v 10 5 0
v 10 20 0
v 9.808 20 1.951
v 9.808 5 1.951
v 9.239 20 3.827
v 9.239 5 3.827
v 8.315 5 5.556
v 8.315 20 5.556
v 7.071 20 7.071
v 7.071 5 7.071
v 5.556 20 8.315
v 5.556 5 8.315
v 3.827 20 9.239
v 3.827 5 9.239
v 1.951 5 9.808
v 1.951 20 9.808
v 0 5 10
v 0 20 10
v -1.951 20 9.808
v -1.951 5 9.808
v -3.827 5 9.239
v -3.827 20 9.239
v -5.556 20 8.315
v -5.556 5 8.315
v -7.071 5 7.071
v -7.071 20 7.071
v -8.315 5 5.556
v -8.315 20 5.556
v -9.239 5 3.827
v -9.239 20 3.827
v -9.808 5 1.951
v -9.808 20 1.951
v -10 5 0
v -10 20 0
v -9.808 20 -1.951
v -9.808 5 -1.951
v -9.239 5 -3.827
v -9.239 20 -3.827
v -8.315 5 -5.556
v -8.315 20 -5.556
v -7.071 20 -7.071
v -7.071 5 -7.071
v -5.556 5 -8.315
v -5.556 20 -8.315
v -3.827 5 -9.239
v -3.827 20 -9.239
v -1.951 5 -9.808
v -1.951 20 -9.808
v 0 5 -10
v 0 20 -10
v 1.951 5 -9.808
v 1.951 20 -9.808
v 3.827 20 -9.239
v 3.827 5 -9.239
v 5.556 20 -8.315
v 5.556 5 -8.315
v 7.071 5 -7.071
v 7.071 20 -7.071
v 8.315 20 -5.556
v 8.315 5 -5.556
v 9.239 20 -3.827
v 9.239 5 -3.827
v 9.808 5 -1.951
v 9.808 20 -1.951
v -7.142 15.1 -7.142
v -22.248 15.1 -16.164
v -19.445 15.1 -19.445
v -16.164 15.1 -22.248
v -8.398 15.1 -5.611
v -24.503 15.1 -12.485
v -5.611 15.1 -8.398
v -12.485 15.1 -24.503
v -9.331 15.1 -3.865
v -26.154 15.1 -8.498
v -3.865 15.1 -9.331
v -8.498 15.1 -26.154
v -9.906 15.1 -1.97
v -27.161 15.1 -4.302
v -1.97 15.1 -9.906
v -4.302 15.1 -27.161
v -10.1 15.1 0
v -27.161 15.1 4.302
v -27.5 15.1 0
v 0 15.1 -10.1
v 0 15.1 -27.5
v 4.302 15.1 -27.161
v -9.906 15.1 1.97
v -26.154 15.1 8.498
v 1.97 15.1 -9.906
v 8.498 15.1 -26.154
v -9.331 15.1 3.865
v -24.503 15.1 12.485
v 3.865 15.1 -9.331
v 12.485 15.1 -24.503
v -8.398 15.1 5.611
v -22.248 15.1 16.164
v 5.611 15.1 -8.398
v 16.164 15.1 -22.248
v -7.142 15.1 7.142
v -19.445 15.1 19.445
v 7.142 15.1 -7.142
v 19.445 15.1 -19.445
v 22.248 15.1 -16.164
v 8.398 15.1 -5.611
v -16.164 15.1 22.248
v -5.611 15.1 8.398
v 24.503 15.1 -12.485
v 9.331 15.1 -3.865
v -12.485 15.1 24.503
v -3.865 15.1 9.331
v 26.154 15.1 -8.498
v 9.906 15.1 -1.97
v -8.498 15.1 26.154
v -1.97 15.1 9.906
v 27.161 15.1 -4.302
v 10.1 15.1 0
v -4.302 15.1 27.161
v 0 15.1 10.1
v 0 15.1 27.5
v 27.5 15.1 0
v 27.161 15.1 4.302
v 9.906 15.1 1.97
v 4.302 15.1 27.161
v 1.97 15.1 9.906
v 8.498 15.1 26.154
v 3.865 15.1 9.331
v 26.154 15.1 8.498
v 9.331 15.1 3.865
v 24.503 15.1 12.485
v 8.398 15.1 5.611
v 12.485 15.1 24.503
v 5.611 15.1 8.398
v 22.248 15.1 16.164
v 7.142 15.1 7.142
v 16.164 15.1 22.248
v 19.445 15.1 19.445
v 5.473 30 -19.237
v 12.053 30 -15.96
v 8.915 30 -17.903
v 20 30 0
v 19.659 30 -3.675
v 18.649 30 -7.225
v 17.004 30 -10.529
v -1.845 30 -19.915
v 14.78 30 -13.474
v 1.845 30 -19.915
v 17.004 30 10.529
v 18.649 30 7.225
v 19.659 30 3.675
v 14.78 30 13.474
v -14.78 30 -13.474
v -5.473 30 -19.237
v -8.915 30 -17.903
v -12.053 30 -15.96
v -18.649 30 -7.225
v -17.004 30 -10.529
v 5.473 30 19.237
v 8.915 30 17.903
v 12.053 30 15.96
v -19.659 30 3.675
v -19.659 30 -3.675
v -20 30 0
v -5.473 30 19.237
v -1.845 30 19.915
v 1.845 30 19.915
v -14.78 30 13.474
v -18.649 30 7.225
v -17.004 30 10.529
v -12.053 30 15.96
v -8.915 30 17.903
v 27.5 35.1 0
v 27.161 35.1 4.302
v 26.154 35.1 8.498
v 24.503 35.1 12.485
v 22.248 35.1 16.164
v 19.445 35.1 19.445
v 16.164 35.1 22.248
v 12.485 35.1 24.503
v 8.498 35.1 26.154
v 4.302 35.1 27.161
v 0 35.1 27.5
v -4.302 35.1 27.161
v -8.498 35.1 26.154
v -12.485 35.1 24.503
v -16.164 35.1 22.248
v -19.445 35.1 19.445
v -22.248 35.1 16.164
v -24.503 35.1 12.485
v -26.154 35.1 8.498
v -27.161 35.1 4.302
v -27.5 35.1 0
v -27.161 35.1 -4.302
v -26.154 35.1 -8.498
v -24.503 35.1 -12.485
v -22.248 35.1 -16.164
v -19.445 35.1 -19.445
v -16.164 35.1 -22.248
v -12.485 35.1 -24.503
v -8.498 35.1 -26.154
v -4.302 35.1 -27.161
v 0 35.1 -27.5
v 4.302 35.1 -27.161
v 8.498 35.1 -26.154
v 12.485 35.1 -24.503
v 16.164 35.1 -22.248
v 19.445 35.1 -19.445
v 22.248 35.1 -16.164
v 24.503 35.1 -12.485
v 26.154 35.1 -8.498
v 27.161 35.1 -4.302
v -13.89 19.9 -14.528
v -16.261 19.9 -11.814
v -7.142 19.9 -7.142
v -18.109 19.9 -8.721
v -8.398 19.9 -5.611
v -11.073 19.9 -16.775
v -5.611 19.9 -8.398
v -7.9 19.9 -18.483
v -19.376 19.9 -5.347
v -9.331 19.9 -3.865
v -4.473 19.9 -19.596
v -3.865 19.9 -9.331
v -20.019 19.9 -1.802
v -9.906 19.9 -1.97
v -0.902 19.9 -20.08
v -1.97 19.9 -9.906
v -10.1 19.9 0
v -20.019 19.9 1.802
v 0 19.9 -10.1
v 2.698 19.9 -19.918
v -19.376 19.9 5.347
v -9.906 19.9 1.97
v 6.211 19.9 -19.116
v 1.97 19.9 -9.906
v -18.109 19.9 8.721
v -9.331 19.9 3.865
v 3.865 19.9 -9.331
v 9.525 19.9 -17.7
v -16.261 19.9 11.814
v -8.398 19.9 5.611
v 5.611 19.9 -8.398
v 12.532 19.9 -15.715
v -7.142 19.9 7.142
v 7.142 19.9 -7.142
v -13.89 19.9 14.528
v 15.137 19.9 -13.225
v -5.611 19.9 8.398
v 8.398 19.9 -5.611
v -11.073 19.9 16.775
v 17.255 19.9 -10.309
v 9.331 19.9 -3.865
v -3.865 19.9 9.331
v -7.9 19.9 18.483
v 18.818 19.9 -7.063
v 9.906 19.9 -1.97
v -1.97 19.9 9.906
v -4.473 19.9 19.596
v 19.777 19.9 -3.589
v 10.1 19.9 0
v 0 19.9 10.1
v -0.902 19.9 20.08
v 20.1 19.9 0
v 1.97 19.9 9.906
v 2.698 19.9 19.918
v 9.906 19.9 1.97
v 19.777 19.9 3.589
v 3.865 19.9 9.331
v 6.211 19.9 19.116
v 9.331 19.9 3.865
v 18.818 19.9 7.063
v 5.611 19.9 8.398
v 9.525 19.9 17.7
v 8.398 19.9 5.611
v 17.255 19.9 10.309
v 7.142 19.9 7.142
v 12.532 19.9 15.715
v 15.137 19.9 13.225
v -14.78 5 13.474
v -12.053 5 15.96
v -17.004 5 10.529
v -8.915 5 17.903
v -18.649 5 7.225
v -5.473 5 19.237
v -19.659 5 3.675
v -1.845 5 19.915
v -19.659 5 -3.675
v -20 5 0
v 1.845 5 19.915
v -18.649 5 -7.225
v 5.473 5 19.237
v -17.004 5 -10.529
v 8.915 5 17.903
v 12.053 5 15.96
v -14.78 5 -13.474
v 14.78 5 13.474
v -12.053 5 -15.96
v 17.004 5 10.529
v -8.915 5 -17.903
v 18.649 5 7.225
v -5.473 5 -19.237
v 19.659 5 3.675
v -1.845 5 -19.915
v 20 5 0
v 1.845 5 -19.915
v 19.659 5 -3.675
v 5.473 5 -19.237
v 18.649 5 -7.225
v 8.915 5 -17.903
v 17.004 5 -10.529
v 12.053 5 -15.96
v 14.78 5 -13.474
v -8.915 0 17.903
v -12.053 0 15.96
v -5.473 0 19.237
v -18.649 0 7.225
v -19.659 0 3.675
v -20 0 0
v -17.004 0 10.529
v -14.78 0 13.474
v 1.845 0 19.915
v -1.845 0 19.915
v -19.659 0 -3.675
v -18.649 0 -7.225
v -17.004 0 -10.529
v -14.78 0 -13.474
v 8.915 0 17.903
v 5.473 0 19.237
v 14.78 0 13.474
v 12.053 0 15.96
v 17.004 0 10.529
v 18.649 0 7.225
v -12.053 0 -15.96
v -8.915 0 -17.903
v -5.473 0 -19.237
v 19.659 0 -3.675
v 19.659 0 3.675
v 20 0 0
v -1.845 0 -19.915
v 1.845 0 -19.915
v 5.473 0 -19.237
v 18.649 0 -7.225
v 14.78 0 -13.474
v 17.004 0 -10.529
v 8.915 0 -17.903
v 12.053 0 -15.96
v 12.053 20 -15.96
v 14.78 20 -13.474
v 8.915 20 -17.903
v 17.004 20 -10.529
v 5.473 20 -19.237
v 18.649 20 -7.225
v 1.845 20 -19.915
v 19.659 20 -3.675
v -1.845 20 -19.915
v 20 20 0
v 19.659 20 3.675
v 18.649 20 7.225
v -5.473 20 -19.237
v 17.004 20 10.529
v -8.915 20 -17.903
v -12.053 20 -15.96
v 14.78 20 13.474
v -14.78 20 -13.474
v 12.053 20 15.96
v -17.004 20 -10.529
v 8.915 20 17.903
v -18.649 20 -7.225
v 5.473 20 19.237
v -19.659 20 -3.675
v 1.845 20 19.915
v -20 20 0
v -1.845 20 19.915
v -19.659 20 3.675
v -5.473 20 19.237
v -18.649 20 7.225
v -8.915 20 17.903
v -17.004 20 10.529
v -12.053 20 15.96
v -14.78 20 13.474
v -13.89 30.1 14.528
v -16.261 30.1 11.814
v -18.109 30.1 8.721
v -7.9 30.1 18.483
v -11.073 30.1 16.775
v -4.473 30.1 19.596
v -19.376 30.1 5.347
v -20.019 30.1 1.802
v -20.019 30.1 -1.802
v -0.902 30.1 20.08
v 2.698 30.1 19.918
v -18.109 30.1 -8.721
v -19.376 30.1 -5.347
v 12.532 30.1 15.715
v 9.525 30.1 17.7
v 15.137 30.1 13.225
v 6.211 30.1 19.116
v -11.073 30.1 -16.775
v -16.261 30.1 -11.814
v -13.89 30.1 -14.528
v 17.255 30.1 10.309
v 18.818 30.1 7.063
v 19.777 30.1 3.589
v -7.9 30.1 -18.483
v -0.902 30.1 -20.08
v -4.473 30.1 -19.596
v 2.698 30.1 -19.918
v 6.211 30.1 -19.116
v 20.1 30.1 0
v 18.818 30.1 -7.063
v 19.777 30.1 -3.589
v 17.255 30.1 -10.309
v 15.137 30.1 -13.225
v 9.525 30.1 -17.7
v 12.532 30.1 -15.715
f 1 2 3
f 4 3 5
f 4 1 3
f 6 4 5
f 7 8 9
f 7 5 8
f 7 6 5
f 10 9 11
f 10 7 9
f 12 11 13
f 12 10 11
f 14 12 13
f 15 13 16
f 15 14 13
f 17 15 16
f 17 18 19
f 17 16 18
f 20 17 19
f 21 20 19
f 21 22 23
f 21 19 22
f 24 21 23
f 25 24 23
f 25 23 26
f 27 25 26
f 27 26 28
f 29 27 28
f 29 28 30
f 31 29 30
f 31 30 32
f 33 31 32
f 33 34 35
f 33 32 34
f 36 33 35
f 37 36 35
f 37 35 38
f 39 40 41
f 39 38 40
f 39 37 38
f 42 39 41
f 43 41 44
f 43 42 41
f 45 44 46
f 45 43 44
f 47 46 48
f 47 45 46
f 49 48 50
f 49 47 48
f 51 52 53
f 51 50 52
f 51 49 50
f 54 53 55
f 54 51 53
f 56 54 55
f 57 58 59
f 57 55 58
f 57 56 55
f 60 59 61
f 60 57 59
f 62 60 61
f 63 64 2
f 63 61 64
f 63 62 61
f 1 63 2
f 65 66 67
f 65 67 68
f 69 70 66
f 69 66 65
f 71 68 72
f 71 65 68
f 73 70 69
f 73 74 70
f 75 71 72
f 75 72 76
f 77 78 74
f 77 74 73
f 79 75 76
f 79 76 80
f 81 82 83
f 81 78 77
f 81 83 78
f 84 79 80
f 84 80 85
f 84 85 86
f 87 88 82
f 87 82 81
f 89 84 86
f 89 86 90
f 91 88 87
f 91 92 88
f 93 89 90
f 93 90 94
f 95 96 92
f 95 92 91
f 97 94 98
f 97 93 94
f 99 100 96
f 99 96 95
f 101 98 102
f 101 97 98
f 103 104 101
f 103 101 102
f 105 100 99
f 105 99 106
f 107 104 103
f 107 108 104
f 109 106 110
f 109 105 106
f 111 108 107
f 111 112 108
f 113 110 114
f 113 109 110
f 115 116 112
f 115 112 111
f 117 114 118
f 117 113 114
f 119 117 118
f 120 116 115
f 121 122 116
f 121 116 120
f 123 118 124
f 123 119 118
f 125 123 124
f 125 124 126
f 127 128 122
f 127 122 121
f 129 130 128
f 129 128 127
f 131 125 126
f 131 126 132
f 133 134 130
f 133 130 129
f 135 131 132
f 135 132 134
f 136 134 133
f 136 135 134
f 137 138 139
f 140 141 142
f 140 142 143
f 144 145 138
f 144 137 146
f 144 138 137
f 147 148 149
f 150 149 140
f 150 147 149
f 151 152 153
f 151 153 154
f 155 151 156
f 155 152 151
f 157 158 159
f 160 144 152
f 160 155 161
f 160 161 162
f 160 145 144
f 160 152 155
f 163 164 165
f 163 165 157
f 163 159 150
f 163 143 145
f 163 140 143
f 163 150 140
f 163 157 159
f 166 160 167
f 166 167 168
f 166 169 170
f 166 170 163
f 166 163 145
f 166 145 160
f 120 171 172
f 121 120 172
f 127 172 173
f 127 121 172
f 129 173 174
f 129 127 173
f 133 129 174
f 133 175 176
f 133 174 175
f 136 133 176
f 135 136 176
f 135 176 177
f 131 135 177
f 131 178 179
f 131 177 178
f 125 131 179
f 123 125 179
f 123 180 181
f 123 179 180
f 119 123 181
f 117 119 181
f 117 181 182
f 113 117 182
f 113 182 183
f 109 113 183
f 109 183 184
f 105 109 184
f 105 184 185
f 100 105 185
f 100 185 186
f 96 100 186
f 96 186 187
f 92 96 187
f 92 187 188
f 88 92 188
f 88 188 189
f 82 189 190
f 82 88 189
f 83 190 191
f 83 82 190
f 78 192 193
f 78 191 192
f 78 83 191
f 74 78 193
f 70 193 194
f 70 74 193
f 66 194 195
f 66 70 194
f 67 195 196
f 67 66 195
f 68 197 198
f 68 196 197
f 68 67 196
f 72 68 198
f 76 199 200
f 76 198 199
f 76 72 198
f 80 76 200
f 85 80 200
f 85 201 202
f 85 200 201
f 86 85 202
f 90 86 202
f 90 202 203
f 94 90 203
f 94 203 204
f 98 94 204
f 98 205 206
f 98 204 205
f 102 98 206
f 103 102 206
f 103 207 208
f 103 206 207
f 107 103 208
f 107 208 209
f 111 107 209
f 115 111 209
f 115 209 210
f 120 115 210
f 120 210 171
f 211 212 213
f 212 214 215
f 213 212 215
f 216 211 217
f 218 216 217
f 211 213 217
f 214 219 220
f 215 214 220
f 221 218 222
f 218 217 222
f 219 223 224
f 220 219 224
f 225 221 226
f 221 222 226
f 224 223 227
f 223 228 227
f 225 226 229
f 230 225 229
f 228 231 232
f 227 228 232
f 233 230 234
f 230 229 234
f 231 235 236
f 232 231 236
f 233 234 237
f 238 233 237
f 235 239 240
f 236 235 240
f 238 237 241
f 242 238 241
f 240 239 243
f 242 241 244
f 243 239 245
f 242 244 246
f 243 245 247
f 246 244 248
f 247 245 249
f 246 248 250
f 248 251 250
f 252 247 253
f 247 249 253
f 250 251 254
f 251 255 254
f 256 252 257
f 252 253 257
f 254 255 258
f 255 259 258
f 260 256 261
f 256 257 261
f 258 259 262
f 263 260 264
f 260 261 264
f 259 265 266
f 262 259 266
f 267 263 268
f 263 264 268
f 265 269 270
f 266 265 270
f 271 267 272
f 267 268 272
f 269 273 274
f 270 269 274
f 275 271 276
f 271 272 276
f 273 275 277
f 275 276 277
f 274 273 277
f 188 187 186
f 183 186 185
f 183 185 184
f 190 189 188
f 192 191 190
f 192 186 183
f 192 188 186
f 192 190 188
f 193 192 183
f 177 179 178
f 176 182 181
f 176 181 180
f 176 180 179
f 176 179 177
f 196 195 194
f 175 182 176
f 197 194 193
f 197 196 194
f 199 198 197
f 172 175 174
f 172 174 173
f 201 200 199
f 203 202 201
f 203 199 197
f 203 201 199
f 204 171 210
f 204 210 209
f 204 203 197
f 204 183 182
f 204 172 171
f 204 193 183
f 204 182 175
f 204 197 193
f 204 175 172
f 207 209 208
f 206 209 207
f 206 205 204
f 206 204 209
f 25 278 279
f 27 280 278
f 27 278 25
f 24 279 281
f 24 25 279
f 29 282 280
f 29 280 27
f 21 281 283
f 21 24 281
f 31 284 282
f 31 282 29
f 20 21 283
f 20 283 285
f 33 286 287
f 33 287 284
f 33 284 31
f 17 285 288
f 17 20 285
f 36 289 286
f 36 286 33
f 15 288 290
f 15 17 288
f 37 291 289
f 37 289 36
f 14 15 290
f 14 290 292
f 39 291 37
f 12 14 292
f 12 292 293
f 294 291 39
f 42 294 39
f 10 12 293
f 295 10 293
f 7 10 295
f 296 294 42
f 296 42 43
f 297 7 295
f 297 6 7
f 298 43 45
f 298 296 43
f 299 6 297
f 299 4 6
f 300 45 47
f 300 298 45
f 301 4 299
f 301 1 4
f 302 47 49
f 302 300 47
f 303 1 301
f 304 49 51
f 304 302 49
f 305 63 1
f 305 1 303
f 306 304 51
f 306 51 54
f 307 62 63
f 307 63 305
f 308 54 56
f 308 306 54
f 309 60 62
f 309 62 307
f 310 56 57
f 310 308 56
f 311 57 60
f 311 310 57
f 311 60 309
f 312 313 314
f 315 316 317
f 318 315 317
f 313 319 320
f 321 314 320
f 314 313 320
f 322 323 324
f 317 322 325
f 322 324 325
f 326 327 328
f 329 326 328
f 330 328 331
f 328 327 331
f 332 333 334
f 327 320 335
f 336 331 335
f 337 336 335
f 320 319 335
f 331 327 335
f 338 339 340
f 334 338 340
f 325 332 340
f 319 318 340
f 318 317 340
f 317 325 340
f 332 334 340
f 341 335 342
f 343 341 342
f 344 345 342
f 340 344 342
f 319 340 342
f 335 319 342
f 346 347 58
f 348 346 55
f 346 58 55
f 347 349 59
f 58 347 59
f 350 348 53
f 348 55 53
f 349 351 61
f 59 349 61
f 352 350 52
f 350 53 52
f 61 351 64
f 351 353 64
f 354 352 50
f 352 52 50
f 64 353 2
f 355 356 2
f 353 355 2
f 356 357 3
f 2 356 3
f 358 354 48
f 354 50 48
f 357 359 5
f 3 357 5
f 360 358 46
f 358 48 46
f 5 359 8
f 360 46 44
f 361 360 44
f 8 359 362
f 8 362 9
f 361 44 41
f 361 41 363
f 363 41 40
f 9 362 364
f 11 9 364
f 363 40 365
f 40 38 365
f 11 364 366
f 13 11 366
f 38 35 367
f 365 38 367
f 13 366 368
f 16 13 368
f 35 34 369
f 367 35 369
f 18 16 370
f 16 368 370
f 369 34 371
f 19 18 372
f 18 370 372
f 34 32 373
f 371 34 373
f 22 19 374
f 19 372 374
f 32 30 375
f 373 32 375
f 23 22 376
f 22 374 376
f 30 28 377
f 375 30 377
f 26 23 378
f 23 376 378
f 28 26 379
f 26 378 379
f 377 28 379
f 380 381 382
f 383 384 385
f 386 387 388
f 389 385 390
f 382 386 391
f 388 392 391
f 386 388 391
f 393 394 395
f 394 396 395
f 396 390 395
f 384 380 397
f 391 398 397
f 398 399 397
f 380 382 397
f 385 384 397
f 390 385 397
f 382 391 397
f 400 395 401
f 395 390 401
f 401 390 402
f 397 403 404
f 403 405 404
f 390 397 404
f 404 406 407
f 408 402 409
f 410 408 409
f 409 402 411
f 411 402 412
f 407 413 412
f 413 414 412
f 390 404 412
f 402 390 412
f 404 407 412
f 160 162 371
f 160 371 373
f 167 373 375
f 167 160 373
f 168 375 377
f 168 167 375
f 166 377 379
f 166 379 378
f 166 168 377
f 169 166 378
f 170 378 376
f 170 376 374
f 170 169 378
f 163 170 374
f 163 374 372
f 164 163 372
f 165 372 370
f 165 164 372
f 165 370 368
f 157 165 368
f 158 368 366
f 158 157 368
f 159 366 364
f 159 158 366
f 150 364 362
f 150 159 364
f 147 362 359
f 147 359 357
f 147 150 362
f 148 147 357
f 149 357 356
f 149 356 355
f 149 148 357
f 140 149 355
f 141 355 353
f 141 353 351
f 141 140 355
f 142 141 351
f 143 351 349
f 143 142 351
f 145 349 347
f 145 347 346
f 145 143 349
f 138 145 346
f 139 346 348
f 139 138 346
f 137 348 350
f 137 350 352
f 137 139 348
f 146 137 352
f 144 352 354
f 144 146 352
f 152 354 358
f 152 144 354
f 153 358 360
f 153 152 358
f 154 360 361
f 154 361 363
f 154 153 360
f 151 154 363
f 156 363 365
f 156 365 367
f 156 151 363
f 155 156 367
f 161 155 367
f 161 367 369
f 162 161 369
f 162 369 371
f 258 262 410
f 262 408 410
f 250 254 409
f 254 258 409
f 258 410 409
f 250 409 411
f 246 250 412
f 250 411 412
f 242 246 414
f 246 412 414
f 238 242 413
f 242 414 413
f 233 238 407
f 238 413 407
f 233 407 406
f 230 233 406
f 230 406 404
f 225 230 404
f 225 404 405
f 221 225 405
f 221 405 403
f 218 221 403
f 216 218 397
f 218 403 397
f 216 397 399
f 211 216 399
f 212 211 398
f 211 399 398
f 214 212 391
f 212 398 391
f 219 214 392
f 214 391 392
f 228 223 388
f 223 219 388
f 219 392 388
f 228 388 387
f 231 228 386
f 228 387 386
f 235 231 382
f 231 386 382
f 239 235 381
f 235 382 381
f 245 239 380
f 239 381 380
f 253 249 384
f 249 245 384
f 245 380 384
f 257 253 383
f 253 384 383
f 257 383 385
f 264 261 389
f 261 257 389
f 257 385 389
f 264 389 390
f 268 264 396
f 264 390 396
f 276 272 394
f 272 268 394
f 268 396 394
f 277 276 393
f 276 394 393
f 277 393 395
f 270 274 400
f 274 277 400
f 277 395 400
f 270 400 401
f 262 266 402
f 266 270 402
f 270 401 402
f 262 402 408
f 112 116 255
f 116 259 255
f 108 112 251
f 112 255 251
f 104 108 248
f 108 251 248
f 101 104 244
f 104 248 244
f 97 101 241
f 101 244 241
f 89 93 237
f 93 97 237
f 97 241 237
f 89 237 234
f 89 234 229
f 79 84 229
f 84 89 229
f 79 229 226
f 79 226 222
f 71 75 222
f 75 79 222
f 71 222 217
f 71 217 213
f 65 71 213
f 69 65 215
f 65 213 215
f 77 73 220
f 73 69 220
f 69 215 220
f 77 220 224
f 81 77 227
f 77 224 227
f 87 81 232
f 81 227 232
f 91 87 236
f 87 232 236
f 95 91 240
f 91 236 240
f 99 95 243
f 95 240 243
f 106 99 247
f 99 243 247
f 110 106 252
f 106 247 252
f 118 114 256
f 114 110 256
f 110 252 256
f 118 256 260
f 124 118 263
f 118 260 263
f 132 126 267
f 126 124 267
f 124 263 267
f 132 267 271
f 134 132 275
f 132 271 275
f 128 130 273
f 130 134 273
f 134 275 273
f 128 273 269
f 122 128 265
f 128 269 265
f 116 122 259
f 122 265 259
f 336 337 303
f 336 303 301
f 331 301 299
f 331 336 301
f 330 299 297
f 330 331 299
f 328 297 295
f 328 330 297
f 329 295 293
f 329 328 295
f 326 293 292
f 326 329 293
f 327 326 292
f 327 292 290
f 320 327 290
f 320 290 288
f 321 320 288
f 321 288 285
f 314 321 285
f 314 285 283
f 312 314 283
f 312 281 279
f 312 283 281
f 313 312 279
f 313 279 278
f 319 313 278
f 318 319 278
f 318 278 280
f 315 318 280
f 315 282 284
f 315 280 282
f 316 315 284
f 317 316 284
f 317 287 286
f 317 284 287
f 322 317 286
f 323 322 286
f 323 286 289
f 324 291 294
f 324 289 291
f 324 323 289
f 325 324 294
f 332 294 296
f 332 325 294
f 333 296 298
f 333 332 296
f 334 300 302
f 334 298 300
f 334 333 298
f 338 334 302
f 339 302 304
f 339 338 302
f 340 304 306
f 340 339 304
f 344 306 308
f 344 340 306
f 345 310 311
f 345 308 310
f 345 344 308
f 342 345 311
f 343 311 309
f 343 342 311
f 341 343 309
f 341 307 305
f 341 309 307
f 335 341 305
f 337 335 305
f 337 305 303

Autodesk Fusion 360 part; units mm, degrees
sketch "Sketch1" plane through (0, 0, 0) normal (0, 1, 0) x (1, 0, 0)
  circle A0 centre (0, 0) radius 20
  circle A1 centre (0, 0) radius 10
  dimension "d1" = 40
  dimension "d2" = 20
extrude "Extrude1" add sketch "Sketch1" along normal blind 5 makes body 1
sketch "Sketch2" plane through (0, 0, 0) normal (0, 1, 0) x (1, 0, 0)
  circle A0 centre (0, 0) radius 10
  circle A1 centre (0, 0) radius 20
  circle A2 centre (0, 0) radius 10
extrude "Extrude2" add sketch "Sketch2" along normal blind 30 contours A0 A2 bodies 1
sketch "Sketch3" plane through (0, 30, 0) normal (0, 1, 0) x (-1, 0, 0)
  circle A0 centre (0, 0) radius 10
  circle A1 centre (0, 0) radius 20
  dimension "d7" = 40
extrude "Extrude3" add sketch "Sketch3" against normal blind 10 bodies 1
ref_plane "WorkPlane1" through (0, 30.1, 0) normal (0, 1, 0) x (1, 0, 0)
sketch "Sketch4" plane through (0, 30.1, 0) normal (0, 1, 0) x (1, 0, 0)
  circle A0 centre (0, 0) radius 27.5
  dimension "d11" = 55
extrude "Extrude4" add sketch "Sketch4" along normal blind 5 separate body makes body 2
ref_plane "WorkPlane2" through (0, 30.1, 0) normal (0, -1, 0) x (-1, 0, 0)
sketch "Sketch5" plane through (0, 30.1, 0) normal (0, -1, 0) x (1, 0, 0)
  circle A0 centre (0, 0) radius 20
  circle A1 centre (0, 0) radius 27.5
  circle A2 centre (0, 0) radius 20.1
  circle A3 centre (0, 0) radius 27.5
  dimension "d15" = 40.2
extrude "Extrude5" add sketch "Sketch5" along normal blind 15 contours A1 A3 bodies 2
ref_plane "WorkPlane3" through (0, 19.9, 0) normal (0, -1, 0) x (1, 0, 0)
sketch "Sketch8" plane through (0, 19.9, 0) normal (0, -1, 0) x (1, 0, 0)
  circle A0 centre (0, 0) radius 10
  circle A1 centre (0, 0) radius 20
  circle A2 centre (0, 0) radius 10.1
  circle A3 centre (0, 0) radius 20.1
  dimension "d20" = 20.2
  dimension "d21" = 40.2
extrude "Extrude8" add sketch "Sketch8" along normal blind 4.9 separate body contours A1 makes body 3
extrude "Extrude9" add sketch "Sketch8" along normal blind 4.9 contours A3 bodies 2 3
extrude "Extrude10" cut 1 faces at (16.6918, 15, -0.9986) along direction (0, 1, 0) blind 0.1 on bodies 2 bodies 2
